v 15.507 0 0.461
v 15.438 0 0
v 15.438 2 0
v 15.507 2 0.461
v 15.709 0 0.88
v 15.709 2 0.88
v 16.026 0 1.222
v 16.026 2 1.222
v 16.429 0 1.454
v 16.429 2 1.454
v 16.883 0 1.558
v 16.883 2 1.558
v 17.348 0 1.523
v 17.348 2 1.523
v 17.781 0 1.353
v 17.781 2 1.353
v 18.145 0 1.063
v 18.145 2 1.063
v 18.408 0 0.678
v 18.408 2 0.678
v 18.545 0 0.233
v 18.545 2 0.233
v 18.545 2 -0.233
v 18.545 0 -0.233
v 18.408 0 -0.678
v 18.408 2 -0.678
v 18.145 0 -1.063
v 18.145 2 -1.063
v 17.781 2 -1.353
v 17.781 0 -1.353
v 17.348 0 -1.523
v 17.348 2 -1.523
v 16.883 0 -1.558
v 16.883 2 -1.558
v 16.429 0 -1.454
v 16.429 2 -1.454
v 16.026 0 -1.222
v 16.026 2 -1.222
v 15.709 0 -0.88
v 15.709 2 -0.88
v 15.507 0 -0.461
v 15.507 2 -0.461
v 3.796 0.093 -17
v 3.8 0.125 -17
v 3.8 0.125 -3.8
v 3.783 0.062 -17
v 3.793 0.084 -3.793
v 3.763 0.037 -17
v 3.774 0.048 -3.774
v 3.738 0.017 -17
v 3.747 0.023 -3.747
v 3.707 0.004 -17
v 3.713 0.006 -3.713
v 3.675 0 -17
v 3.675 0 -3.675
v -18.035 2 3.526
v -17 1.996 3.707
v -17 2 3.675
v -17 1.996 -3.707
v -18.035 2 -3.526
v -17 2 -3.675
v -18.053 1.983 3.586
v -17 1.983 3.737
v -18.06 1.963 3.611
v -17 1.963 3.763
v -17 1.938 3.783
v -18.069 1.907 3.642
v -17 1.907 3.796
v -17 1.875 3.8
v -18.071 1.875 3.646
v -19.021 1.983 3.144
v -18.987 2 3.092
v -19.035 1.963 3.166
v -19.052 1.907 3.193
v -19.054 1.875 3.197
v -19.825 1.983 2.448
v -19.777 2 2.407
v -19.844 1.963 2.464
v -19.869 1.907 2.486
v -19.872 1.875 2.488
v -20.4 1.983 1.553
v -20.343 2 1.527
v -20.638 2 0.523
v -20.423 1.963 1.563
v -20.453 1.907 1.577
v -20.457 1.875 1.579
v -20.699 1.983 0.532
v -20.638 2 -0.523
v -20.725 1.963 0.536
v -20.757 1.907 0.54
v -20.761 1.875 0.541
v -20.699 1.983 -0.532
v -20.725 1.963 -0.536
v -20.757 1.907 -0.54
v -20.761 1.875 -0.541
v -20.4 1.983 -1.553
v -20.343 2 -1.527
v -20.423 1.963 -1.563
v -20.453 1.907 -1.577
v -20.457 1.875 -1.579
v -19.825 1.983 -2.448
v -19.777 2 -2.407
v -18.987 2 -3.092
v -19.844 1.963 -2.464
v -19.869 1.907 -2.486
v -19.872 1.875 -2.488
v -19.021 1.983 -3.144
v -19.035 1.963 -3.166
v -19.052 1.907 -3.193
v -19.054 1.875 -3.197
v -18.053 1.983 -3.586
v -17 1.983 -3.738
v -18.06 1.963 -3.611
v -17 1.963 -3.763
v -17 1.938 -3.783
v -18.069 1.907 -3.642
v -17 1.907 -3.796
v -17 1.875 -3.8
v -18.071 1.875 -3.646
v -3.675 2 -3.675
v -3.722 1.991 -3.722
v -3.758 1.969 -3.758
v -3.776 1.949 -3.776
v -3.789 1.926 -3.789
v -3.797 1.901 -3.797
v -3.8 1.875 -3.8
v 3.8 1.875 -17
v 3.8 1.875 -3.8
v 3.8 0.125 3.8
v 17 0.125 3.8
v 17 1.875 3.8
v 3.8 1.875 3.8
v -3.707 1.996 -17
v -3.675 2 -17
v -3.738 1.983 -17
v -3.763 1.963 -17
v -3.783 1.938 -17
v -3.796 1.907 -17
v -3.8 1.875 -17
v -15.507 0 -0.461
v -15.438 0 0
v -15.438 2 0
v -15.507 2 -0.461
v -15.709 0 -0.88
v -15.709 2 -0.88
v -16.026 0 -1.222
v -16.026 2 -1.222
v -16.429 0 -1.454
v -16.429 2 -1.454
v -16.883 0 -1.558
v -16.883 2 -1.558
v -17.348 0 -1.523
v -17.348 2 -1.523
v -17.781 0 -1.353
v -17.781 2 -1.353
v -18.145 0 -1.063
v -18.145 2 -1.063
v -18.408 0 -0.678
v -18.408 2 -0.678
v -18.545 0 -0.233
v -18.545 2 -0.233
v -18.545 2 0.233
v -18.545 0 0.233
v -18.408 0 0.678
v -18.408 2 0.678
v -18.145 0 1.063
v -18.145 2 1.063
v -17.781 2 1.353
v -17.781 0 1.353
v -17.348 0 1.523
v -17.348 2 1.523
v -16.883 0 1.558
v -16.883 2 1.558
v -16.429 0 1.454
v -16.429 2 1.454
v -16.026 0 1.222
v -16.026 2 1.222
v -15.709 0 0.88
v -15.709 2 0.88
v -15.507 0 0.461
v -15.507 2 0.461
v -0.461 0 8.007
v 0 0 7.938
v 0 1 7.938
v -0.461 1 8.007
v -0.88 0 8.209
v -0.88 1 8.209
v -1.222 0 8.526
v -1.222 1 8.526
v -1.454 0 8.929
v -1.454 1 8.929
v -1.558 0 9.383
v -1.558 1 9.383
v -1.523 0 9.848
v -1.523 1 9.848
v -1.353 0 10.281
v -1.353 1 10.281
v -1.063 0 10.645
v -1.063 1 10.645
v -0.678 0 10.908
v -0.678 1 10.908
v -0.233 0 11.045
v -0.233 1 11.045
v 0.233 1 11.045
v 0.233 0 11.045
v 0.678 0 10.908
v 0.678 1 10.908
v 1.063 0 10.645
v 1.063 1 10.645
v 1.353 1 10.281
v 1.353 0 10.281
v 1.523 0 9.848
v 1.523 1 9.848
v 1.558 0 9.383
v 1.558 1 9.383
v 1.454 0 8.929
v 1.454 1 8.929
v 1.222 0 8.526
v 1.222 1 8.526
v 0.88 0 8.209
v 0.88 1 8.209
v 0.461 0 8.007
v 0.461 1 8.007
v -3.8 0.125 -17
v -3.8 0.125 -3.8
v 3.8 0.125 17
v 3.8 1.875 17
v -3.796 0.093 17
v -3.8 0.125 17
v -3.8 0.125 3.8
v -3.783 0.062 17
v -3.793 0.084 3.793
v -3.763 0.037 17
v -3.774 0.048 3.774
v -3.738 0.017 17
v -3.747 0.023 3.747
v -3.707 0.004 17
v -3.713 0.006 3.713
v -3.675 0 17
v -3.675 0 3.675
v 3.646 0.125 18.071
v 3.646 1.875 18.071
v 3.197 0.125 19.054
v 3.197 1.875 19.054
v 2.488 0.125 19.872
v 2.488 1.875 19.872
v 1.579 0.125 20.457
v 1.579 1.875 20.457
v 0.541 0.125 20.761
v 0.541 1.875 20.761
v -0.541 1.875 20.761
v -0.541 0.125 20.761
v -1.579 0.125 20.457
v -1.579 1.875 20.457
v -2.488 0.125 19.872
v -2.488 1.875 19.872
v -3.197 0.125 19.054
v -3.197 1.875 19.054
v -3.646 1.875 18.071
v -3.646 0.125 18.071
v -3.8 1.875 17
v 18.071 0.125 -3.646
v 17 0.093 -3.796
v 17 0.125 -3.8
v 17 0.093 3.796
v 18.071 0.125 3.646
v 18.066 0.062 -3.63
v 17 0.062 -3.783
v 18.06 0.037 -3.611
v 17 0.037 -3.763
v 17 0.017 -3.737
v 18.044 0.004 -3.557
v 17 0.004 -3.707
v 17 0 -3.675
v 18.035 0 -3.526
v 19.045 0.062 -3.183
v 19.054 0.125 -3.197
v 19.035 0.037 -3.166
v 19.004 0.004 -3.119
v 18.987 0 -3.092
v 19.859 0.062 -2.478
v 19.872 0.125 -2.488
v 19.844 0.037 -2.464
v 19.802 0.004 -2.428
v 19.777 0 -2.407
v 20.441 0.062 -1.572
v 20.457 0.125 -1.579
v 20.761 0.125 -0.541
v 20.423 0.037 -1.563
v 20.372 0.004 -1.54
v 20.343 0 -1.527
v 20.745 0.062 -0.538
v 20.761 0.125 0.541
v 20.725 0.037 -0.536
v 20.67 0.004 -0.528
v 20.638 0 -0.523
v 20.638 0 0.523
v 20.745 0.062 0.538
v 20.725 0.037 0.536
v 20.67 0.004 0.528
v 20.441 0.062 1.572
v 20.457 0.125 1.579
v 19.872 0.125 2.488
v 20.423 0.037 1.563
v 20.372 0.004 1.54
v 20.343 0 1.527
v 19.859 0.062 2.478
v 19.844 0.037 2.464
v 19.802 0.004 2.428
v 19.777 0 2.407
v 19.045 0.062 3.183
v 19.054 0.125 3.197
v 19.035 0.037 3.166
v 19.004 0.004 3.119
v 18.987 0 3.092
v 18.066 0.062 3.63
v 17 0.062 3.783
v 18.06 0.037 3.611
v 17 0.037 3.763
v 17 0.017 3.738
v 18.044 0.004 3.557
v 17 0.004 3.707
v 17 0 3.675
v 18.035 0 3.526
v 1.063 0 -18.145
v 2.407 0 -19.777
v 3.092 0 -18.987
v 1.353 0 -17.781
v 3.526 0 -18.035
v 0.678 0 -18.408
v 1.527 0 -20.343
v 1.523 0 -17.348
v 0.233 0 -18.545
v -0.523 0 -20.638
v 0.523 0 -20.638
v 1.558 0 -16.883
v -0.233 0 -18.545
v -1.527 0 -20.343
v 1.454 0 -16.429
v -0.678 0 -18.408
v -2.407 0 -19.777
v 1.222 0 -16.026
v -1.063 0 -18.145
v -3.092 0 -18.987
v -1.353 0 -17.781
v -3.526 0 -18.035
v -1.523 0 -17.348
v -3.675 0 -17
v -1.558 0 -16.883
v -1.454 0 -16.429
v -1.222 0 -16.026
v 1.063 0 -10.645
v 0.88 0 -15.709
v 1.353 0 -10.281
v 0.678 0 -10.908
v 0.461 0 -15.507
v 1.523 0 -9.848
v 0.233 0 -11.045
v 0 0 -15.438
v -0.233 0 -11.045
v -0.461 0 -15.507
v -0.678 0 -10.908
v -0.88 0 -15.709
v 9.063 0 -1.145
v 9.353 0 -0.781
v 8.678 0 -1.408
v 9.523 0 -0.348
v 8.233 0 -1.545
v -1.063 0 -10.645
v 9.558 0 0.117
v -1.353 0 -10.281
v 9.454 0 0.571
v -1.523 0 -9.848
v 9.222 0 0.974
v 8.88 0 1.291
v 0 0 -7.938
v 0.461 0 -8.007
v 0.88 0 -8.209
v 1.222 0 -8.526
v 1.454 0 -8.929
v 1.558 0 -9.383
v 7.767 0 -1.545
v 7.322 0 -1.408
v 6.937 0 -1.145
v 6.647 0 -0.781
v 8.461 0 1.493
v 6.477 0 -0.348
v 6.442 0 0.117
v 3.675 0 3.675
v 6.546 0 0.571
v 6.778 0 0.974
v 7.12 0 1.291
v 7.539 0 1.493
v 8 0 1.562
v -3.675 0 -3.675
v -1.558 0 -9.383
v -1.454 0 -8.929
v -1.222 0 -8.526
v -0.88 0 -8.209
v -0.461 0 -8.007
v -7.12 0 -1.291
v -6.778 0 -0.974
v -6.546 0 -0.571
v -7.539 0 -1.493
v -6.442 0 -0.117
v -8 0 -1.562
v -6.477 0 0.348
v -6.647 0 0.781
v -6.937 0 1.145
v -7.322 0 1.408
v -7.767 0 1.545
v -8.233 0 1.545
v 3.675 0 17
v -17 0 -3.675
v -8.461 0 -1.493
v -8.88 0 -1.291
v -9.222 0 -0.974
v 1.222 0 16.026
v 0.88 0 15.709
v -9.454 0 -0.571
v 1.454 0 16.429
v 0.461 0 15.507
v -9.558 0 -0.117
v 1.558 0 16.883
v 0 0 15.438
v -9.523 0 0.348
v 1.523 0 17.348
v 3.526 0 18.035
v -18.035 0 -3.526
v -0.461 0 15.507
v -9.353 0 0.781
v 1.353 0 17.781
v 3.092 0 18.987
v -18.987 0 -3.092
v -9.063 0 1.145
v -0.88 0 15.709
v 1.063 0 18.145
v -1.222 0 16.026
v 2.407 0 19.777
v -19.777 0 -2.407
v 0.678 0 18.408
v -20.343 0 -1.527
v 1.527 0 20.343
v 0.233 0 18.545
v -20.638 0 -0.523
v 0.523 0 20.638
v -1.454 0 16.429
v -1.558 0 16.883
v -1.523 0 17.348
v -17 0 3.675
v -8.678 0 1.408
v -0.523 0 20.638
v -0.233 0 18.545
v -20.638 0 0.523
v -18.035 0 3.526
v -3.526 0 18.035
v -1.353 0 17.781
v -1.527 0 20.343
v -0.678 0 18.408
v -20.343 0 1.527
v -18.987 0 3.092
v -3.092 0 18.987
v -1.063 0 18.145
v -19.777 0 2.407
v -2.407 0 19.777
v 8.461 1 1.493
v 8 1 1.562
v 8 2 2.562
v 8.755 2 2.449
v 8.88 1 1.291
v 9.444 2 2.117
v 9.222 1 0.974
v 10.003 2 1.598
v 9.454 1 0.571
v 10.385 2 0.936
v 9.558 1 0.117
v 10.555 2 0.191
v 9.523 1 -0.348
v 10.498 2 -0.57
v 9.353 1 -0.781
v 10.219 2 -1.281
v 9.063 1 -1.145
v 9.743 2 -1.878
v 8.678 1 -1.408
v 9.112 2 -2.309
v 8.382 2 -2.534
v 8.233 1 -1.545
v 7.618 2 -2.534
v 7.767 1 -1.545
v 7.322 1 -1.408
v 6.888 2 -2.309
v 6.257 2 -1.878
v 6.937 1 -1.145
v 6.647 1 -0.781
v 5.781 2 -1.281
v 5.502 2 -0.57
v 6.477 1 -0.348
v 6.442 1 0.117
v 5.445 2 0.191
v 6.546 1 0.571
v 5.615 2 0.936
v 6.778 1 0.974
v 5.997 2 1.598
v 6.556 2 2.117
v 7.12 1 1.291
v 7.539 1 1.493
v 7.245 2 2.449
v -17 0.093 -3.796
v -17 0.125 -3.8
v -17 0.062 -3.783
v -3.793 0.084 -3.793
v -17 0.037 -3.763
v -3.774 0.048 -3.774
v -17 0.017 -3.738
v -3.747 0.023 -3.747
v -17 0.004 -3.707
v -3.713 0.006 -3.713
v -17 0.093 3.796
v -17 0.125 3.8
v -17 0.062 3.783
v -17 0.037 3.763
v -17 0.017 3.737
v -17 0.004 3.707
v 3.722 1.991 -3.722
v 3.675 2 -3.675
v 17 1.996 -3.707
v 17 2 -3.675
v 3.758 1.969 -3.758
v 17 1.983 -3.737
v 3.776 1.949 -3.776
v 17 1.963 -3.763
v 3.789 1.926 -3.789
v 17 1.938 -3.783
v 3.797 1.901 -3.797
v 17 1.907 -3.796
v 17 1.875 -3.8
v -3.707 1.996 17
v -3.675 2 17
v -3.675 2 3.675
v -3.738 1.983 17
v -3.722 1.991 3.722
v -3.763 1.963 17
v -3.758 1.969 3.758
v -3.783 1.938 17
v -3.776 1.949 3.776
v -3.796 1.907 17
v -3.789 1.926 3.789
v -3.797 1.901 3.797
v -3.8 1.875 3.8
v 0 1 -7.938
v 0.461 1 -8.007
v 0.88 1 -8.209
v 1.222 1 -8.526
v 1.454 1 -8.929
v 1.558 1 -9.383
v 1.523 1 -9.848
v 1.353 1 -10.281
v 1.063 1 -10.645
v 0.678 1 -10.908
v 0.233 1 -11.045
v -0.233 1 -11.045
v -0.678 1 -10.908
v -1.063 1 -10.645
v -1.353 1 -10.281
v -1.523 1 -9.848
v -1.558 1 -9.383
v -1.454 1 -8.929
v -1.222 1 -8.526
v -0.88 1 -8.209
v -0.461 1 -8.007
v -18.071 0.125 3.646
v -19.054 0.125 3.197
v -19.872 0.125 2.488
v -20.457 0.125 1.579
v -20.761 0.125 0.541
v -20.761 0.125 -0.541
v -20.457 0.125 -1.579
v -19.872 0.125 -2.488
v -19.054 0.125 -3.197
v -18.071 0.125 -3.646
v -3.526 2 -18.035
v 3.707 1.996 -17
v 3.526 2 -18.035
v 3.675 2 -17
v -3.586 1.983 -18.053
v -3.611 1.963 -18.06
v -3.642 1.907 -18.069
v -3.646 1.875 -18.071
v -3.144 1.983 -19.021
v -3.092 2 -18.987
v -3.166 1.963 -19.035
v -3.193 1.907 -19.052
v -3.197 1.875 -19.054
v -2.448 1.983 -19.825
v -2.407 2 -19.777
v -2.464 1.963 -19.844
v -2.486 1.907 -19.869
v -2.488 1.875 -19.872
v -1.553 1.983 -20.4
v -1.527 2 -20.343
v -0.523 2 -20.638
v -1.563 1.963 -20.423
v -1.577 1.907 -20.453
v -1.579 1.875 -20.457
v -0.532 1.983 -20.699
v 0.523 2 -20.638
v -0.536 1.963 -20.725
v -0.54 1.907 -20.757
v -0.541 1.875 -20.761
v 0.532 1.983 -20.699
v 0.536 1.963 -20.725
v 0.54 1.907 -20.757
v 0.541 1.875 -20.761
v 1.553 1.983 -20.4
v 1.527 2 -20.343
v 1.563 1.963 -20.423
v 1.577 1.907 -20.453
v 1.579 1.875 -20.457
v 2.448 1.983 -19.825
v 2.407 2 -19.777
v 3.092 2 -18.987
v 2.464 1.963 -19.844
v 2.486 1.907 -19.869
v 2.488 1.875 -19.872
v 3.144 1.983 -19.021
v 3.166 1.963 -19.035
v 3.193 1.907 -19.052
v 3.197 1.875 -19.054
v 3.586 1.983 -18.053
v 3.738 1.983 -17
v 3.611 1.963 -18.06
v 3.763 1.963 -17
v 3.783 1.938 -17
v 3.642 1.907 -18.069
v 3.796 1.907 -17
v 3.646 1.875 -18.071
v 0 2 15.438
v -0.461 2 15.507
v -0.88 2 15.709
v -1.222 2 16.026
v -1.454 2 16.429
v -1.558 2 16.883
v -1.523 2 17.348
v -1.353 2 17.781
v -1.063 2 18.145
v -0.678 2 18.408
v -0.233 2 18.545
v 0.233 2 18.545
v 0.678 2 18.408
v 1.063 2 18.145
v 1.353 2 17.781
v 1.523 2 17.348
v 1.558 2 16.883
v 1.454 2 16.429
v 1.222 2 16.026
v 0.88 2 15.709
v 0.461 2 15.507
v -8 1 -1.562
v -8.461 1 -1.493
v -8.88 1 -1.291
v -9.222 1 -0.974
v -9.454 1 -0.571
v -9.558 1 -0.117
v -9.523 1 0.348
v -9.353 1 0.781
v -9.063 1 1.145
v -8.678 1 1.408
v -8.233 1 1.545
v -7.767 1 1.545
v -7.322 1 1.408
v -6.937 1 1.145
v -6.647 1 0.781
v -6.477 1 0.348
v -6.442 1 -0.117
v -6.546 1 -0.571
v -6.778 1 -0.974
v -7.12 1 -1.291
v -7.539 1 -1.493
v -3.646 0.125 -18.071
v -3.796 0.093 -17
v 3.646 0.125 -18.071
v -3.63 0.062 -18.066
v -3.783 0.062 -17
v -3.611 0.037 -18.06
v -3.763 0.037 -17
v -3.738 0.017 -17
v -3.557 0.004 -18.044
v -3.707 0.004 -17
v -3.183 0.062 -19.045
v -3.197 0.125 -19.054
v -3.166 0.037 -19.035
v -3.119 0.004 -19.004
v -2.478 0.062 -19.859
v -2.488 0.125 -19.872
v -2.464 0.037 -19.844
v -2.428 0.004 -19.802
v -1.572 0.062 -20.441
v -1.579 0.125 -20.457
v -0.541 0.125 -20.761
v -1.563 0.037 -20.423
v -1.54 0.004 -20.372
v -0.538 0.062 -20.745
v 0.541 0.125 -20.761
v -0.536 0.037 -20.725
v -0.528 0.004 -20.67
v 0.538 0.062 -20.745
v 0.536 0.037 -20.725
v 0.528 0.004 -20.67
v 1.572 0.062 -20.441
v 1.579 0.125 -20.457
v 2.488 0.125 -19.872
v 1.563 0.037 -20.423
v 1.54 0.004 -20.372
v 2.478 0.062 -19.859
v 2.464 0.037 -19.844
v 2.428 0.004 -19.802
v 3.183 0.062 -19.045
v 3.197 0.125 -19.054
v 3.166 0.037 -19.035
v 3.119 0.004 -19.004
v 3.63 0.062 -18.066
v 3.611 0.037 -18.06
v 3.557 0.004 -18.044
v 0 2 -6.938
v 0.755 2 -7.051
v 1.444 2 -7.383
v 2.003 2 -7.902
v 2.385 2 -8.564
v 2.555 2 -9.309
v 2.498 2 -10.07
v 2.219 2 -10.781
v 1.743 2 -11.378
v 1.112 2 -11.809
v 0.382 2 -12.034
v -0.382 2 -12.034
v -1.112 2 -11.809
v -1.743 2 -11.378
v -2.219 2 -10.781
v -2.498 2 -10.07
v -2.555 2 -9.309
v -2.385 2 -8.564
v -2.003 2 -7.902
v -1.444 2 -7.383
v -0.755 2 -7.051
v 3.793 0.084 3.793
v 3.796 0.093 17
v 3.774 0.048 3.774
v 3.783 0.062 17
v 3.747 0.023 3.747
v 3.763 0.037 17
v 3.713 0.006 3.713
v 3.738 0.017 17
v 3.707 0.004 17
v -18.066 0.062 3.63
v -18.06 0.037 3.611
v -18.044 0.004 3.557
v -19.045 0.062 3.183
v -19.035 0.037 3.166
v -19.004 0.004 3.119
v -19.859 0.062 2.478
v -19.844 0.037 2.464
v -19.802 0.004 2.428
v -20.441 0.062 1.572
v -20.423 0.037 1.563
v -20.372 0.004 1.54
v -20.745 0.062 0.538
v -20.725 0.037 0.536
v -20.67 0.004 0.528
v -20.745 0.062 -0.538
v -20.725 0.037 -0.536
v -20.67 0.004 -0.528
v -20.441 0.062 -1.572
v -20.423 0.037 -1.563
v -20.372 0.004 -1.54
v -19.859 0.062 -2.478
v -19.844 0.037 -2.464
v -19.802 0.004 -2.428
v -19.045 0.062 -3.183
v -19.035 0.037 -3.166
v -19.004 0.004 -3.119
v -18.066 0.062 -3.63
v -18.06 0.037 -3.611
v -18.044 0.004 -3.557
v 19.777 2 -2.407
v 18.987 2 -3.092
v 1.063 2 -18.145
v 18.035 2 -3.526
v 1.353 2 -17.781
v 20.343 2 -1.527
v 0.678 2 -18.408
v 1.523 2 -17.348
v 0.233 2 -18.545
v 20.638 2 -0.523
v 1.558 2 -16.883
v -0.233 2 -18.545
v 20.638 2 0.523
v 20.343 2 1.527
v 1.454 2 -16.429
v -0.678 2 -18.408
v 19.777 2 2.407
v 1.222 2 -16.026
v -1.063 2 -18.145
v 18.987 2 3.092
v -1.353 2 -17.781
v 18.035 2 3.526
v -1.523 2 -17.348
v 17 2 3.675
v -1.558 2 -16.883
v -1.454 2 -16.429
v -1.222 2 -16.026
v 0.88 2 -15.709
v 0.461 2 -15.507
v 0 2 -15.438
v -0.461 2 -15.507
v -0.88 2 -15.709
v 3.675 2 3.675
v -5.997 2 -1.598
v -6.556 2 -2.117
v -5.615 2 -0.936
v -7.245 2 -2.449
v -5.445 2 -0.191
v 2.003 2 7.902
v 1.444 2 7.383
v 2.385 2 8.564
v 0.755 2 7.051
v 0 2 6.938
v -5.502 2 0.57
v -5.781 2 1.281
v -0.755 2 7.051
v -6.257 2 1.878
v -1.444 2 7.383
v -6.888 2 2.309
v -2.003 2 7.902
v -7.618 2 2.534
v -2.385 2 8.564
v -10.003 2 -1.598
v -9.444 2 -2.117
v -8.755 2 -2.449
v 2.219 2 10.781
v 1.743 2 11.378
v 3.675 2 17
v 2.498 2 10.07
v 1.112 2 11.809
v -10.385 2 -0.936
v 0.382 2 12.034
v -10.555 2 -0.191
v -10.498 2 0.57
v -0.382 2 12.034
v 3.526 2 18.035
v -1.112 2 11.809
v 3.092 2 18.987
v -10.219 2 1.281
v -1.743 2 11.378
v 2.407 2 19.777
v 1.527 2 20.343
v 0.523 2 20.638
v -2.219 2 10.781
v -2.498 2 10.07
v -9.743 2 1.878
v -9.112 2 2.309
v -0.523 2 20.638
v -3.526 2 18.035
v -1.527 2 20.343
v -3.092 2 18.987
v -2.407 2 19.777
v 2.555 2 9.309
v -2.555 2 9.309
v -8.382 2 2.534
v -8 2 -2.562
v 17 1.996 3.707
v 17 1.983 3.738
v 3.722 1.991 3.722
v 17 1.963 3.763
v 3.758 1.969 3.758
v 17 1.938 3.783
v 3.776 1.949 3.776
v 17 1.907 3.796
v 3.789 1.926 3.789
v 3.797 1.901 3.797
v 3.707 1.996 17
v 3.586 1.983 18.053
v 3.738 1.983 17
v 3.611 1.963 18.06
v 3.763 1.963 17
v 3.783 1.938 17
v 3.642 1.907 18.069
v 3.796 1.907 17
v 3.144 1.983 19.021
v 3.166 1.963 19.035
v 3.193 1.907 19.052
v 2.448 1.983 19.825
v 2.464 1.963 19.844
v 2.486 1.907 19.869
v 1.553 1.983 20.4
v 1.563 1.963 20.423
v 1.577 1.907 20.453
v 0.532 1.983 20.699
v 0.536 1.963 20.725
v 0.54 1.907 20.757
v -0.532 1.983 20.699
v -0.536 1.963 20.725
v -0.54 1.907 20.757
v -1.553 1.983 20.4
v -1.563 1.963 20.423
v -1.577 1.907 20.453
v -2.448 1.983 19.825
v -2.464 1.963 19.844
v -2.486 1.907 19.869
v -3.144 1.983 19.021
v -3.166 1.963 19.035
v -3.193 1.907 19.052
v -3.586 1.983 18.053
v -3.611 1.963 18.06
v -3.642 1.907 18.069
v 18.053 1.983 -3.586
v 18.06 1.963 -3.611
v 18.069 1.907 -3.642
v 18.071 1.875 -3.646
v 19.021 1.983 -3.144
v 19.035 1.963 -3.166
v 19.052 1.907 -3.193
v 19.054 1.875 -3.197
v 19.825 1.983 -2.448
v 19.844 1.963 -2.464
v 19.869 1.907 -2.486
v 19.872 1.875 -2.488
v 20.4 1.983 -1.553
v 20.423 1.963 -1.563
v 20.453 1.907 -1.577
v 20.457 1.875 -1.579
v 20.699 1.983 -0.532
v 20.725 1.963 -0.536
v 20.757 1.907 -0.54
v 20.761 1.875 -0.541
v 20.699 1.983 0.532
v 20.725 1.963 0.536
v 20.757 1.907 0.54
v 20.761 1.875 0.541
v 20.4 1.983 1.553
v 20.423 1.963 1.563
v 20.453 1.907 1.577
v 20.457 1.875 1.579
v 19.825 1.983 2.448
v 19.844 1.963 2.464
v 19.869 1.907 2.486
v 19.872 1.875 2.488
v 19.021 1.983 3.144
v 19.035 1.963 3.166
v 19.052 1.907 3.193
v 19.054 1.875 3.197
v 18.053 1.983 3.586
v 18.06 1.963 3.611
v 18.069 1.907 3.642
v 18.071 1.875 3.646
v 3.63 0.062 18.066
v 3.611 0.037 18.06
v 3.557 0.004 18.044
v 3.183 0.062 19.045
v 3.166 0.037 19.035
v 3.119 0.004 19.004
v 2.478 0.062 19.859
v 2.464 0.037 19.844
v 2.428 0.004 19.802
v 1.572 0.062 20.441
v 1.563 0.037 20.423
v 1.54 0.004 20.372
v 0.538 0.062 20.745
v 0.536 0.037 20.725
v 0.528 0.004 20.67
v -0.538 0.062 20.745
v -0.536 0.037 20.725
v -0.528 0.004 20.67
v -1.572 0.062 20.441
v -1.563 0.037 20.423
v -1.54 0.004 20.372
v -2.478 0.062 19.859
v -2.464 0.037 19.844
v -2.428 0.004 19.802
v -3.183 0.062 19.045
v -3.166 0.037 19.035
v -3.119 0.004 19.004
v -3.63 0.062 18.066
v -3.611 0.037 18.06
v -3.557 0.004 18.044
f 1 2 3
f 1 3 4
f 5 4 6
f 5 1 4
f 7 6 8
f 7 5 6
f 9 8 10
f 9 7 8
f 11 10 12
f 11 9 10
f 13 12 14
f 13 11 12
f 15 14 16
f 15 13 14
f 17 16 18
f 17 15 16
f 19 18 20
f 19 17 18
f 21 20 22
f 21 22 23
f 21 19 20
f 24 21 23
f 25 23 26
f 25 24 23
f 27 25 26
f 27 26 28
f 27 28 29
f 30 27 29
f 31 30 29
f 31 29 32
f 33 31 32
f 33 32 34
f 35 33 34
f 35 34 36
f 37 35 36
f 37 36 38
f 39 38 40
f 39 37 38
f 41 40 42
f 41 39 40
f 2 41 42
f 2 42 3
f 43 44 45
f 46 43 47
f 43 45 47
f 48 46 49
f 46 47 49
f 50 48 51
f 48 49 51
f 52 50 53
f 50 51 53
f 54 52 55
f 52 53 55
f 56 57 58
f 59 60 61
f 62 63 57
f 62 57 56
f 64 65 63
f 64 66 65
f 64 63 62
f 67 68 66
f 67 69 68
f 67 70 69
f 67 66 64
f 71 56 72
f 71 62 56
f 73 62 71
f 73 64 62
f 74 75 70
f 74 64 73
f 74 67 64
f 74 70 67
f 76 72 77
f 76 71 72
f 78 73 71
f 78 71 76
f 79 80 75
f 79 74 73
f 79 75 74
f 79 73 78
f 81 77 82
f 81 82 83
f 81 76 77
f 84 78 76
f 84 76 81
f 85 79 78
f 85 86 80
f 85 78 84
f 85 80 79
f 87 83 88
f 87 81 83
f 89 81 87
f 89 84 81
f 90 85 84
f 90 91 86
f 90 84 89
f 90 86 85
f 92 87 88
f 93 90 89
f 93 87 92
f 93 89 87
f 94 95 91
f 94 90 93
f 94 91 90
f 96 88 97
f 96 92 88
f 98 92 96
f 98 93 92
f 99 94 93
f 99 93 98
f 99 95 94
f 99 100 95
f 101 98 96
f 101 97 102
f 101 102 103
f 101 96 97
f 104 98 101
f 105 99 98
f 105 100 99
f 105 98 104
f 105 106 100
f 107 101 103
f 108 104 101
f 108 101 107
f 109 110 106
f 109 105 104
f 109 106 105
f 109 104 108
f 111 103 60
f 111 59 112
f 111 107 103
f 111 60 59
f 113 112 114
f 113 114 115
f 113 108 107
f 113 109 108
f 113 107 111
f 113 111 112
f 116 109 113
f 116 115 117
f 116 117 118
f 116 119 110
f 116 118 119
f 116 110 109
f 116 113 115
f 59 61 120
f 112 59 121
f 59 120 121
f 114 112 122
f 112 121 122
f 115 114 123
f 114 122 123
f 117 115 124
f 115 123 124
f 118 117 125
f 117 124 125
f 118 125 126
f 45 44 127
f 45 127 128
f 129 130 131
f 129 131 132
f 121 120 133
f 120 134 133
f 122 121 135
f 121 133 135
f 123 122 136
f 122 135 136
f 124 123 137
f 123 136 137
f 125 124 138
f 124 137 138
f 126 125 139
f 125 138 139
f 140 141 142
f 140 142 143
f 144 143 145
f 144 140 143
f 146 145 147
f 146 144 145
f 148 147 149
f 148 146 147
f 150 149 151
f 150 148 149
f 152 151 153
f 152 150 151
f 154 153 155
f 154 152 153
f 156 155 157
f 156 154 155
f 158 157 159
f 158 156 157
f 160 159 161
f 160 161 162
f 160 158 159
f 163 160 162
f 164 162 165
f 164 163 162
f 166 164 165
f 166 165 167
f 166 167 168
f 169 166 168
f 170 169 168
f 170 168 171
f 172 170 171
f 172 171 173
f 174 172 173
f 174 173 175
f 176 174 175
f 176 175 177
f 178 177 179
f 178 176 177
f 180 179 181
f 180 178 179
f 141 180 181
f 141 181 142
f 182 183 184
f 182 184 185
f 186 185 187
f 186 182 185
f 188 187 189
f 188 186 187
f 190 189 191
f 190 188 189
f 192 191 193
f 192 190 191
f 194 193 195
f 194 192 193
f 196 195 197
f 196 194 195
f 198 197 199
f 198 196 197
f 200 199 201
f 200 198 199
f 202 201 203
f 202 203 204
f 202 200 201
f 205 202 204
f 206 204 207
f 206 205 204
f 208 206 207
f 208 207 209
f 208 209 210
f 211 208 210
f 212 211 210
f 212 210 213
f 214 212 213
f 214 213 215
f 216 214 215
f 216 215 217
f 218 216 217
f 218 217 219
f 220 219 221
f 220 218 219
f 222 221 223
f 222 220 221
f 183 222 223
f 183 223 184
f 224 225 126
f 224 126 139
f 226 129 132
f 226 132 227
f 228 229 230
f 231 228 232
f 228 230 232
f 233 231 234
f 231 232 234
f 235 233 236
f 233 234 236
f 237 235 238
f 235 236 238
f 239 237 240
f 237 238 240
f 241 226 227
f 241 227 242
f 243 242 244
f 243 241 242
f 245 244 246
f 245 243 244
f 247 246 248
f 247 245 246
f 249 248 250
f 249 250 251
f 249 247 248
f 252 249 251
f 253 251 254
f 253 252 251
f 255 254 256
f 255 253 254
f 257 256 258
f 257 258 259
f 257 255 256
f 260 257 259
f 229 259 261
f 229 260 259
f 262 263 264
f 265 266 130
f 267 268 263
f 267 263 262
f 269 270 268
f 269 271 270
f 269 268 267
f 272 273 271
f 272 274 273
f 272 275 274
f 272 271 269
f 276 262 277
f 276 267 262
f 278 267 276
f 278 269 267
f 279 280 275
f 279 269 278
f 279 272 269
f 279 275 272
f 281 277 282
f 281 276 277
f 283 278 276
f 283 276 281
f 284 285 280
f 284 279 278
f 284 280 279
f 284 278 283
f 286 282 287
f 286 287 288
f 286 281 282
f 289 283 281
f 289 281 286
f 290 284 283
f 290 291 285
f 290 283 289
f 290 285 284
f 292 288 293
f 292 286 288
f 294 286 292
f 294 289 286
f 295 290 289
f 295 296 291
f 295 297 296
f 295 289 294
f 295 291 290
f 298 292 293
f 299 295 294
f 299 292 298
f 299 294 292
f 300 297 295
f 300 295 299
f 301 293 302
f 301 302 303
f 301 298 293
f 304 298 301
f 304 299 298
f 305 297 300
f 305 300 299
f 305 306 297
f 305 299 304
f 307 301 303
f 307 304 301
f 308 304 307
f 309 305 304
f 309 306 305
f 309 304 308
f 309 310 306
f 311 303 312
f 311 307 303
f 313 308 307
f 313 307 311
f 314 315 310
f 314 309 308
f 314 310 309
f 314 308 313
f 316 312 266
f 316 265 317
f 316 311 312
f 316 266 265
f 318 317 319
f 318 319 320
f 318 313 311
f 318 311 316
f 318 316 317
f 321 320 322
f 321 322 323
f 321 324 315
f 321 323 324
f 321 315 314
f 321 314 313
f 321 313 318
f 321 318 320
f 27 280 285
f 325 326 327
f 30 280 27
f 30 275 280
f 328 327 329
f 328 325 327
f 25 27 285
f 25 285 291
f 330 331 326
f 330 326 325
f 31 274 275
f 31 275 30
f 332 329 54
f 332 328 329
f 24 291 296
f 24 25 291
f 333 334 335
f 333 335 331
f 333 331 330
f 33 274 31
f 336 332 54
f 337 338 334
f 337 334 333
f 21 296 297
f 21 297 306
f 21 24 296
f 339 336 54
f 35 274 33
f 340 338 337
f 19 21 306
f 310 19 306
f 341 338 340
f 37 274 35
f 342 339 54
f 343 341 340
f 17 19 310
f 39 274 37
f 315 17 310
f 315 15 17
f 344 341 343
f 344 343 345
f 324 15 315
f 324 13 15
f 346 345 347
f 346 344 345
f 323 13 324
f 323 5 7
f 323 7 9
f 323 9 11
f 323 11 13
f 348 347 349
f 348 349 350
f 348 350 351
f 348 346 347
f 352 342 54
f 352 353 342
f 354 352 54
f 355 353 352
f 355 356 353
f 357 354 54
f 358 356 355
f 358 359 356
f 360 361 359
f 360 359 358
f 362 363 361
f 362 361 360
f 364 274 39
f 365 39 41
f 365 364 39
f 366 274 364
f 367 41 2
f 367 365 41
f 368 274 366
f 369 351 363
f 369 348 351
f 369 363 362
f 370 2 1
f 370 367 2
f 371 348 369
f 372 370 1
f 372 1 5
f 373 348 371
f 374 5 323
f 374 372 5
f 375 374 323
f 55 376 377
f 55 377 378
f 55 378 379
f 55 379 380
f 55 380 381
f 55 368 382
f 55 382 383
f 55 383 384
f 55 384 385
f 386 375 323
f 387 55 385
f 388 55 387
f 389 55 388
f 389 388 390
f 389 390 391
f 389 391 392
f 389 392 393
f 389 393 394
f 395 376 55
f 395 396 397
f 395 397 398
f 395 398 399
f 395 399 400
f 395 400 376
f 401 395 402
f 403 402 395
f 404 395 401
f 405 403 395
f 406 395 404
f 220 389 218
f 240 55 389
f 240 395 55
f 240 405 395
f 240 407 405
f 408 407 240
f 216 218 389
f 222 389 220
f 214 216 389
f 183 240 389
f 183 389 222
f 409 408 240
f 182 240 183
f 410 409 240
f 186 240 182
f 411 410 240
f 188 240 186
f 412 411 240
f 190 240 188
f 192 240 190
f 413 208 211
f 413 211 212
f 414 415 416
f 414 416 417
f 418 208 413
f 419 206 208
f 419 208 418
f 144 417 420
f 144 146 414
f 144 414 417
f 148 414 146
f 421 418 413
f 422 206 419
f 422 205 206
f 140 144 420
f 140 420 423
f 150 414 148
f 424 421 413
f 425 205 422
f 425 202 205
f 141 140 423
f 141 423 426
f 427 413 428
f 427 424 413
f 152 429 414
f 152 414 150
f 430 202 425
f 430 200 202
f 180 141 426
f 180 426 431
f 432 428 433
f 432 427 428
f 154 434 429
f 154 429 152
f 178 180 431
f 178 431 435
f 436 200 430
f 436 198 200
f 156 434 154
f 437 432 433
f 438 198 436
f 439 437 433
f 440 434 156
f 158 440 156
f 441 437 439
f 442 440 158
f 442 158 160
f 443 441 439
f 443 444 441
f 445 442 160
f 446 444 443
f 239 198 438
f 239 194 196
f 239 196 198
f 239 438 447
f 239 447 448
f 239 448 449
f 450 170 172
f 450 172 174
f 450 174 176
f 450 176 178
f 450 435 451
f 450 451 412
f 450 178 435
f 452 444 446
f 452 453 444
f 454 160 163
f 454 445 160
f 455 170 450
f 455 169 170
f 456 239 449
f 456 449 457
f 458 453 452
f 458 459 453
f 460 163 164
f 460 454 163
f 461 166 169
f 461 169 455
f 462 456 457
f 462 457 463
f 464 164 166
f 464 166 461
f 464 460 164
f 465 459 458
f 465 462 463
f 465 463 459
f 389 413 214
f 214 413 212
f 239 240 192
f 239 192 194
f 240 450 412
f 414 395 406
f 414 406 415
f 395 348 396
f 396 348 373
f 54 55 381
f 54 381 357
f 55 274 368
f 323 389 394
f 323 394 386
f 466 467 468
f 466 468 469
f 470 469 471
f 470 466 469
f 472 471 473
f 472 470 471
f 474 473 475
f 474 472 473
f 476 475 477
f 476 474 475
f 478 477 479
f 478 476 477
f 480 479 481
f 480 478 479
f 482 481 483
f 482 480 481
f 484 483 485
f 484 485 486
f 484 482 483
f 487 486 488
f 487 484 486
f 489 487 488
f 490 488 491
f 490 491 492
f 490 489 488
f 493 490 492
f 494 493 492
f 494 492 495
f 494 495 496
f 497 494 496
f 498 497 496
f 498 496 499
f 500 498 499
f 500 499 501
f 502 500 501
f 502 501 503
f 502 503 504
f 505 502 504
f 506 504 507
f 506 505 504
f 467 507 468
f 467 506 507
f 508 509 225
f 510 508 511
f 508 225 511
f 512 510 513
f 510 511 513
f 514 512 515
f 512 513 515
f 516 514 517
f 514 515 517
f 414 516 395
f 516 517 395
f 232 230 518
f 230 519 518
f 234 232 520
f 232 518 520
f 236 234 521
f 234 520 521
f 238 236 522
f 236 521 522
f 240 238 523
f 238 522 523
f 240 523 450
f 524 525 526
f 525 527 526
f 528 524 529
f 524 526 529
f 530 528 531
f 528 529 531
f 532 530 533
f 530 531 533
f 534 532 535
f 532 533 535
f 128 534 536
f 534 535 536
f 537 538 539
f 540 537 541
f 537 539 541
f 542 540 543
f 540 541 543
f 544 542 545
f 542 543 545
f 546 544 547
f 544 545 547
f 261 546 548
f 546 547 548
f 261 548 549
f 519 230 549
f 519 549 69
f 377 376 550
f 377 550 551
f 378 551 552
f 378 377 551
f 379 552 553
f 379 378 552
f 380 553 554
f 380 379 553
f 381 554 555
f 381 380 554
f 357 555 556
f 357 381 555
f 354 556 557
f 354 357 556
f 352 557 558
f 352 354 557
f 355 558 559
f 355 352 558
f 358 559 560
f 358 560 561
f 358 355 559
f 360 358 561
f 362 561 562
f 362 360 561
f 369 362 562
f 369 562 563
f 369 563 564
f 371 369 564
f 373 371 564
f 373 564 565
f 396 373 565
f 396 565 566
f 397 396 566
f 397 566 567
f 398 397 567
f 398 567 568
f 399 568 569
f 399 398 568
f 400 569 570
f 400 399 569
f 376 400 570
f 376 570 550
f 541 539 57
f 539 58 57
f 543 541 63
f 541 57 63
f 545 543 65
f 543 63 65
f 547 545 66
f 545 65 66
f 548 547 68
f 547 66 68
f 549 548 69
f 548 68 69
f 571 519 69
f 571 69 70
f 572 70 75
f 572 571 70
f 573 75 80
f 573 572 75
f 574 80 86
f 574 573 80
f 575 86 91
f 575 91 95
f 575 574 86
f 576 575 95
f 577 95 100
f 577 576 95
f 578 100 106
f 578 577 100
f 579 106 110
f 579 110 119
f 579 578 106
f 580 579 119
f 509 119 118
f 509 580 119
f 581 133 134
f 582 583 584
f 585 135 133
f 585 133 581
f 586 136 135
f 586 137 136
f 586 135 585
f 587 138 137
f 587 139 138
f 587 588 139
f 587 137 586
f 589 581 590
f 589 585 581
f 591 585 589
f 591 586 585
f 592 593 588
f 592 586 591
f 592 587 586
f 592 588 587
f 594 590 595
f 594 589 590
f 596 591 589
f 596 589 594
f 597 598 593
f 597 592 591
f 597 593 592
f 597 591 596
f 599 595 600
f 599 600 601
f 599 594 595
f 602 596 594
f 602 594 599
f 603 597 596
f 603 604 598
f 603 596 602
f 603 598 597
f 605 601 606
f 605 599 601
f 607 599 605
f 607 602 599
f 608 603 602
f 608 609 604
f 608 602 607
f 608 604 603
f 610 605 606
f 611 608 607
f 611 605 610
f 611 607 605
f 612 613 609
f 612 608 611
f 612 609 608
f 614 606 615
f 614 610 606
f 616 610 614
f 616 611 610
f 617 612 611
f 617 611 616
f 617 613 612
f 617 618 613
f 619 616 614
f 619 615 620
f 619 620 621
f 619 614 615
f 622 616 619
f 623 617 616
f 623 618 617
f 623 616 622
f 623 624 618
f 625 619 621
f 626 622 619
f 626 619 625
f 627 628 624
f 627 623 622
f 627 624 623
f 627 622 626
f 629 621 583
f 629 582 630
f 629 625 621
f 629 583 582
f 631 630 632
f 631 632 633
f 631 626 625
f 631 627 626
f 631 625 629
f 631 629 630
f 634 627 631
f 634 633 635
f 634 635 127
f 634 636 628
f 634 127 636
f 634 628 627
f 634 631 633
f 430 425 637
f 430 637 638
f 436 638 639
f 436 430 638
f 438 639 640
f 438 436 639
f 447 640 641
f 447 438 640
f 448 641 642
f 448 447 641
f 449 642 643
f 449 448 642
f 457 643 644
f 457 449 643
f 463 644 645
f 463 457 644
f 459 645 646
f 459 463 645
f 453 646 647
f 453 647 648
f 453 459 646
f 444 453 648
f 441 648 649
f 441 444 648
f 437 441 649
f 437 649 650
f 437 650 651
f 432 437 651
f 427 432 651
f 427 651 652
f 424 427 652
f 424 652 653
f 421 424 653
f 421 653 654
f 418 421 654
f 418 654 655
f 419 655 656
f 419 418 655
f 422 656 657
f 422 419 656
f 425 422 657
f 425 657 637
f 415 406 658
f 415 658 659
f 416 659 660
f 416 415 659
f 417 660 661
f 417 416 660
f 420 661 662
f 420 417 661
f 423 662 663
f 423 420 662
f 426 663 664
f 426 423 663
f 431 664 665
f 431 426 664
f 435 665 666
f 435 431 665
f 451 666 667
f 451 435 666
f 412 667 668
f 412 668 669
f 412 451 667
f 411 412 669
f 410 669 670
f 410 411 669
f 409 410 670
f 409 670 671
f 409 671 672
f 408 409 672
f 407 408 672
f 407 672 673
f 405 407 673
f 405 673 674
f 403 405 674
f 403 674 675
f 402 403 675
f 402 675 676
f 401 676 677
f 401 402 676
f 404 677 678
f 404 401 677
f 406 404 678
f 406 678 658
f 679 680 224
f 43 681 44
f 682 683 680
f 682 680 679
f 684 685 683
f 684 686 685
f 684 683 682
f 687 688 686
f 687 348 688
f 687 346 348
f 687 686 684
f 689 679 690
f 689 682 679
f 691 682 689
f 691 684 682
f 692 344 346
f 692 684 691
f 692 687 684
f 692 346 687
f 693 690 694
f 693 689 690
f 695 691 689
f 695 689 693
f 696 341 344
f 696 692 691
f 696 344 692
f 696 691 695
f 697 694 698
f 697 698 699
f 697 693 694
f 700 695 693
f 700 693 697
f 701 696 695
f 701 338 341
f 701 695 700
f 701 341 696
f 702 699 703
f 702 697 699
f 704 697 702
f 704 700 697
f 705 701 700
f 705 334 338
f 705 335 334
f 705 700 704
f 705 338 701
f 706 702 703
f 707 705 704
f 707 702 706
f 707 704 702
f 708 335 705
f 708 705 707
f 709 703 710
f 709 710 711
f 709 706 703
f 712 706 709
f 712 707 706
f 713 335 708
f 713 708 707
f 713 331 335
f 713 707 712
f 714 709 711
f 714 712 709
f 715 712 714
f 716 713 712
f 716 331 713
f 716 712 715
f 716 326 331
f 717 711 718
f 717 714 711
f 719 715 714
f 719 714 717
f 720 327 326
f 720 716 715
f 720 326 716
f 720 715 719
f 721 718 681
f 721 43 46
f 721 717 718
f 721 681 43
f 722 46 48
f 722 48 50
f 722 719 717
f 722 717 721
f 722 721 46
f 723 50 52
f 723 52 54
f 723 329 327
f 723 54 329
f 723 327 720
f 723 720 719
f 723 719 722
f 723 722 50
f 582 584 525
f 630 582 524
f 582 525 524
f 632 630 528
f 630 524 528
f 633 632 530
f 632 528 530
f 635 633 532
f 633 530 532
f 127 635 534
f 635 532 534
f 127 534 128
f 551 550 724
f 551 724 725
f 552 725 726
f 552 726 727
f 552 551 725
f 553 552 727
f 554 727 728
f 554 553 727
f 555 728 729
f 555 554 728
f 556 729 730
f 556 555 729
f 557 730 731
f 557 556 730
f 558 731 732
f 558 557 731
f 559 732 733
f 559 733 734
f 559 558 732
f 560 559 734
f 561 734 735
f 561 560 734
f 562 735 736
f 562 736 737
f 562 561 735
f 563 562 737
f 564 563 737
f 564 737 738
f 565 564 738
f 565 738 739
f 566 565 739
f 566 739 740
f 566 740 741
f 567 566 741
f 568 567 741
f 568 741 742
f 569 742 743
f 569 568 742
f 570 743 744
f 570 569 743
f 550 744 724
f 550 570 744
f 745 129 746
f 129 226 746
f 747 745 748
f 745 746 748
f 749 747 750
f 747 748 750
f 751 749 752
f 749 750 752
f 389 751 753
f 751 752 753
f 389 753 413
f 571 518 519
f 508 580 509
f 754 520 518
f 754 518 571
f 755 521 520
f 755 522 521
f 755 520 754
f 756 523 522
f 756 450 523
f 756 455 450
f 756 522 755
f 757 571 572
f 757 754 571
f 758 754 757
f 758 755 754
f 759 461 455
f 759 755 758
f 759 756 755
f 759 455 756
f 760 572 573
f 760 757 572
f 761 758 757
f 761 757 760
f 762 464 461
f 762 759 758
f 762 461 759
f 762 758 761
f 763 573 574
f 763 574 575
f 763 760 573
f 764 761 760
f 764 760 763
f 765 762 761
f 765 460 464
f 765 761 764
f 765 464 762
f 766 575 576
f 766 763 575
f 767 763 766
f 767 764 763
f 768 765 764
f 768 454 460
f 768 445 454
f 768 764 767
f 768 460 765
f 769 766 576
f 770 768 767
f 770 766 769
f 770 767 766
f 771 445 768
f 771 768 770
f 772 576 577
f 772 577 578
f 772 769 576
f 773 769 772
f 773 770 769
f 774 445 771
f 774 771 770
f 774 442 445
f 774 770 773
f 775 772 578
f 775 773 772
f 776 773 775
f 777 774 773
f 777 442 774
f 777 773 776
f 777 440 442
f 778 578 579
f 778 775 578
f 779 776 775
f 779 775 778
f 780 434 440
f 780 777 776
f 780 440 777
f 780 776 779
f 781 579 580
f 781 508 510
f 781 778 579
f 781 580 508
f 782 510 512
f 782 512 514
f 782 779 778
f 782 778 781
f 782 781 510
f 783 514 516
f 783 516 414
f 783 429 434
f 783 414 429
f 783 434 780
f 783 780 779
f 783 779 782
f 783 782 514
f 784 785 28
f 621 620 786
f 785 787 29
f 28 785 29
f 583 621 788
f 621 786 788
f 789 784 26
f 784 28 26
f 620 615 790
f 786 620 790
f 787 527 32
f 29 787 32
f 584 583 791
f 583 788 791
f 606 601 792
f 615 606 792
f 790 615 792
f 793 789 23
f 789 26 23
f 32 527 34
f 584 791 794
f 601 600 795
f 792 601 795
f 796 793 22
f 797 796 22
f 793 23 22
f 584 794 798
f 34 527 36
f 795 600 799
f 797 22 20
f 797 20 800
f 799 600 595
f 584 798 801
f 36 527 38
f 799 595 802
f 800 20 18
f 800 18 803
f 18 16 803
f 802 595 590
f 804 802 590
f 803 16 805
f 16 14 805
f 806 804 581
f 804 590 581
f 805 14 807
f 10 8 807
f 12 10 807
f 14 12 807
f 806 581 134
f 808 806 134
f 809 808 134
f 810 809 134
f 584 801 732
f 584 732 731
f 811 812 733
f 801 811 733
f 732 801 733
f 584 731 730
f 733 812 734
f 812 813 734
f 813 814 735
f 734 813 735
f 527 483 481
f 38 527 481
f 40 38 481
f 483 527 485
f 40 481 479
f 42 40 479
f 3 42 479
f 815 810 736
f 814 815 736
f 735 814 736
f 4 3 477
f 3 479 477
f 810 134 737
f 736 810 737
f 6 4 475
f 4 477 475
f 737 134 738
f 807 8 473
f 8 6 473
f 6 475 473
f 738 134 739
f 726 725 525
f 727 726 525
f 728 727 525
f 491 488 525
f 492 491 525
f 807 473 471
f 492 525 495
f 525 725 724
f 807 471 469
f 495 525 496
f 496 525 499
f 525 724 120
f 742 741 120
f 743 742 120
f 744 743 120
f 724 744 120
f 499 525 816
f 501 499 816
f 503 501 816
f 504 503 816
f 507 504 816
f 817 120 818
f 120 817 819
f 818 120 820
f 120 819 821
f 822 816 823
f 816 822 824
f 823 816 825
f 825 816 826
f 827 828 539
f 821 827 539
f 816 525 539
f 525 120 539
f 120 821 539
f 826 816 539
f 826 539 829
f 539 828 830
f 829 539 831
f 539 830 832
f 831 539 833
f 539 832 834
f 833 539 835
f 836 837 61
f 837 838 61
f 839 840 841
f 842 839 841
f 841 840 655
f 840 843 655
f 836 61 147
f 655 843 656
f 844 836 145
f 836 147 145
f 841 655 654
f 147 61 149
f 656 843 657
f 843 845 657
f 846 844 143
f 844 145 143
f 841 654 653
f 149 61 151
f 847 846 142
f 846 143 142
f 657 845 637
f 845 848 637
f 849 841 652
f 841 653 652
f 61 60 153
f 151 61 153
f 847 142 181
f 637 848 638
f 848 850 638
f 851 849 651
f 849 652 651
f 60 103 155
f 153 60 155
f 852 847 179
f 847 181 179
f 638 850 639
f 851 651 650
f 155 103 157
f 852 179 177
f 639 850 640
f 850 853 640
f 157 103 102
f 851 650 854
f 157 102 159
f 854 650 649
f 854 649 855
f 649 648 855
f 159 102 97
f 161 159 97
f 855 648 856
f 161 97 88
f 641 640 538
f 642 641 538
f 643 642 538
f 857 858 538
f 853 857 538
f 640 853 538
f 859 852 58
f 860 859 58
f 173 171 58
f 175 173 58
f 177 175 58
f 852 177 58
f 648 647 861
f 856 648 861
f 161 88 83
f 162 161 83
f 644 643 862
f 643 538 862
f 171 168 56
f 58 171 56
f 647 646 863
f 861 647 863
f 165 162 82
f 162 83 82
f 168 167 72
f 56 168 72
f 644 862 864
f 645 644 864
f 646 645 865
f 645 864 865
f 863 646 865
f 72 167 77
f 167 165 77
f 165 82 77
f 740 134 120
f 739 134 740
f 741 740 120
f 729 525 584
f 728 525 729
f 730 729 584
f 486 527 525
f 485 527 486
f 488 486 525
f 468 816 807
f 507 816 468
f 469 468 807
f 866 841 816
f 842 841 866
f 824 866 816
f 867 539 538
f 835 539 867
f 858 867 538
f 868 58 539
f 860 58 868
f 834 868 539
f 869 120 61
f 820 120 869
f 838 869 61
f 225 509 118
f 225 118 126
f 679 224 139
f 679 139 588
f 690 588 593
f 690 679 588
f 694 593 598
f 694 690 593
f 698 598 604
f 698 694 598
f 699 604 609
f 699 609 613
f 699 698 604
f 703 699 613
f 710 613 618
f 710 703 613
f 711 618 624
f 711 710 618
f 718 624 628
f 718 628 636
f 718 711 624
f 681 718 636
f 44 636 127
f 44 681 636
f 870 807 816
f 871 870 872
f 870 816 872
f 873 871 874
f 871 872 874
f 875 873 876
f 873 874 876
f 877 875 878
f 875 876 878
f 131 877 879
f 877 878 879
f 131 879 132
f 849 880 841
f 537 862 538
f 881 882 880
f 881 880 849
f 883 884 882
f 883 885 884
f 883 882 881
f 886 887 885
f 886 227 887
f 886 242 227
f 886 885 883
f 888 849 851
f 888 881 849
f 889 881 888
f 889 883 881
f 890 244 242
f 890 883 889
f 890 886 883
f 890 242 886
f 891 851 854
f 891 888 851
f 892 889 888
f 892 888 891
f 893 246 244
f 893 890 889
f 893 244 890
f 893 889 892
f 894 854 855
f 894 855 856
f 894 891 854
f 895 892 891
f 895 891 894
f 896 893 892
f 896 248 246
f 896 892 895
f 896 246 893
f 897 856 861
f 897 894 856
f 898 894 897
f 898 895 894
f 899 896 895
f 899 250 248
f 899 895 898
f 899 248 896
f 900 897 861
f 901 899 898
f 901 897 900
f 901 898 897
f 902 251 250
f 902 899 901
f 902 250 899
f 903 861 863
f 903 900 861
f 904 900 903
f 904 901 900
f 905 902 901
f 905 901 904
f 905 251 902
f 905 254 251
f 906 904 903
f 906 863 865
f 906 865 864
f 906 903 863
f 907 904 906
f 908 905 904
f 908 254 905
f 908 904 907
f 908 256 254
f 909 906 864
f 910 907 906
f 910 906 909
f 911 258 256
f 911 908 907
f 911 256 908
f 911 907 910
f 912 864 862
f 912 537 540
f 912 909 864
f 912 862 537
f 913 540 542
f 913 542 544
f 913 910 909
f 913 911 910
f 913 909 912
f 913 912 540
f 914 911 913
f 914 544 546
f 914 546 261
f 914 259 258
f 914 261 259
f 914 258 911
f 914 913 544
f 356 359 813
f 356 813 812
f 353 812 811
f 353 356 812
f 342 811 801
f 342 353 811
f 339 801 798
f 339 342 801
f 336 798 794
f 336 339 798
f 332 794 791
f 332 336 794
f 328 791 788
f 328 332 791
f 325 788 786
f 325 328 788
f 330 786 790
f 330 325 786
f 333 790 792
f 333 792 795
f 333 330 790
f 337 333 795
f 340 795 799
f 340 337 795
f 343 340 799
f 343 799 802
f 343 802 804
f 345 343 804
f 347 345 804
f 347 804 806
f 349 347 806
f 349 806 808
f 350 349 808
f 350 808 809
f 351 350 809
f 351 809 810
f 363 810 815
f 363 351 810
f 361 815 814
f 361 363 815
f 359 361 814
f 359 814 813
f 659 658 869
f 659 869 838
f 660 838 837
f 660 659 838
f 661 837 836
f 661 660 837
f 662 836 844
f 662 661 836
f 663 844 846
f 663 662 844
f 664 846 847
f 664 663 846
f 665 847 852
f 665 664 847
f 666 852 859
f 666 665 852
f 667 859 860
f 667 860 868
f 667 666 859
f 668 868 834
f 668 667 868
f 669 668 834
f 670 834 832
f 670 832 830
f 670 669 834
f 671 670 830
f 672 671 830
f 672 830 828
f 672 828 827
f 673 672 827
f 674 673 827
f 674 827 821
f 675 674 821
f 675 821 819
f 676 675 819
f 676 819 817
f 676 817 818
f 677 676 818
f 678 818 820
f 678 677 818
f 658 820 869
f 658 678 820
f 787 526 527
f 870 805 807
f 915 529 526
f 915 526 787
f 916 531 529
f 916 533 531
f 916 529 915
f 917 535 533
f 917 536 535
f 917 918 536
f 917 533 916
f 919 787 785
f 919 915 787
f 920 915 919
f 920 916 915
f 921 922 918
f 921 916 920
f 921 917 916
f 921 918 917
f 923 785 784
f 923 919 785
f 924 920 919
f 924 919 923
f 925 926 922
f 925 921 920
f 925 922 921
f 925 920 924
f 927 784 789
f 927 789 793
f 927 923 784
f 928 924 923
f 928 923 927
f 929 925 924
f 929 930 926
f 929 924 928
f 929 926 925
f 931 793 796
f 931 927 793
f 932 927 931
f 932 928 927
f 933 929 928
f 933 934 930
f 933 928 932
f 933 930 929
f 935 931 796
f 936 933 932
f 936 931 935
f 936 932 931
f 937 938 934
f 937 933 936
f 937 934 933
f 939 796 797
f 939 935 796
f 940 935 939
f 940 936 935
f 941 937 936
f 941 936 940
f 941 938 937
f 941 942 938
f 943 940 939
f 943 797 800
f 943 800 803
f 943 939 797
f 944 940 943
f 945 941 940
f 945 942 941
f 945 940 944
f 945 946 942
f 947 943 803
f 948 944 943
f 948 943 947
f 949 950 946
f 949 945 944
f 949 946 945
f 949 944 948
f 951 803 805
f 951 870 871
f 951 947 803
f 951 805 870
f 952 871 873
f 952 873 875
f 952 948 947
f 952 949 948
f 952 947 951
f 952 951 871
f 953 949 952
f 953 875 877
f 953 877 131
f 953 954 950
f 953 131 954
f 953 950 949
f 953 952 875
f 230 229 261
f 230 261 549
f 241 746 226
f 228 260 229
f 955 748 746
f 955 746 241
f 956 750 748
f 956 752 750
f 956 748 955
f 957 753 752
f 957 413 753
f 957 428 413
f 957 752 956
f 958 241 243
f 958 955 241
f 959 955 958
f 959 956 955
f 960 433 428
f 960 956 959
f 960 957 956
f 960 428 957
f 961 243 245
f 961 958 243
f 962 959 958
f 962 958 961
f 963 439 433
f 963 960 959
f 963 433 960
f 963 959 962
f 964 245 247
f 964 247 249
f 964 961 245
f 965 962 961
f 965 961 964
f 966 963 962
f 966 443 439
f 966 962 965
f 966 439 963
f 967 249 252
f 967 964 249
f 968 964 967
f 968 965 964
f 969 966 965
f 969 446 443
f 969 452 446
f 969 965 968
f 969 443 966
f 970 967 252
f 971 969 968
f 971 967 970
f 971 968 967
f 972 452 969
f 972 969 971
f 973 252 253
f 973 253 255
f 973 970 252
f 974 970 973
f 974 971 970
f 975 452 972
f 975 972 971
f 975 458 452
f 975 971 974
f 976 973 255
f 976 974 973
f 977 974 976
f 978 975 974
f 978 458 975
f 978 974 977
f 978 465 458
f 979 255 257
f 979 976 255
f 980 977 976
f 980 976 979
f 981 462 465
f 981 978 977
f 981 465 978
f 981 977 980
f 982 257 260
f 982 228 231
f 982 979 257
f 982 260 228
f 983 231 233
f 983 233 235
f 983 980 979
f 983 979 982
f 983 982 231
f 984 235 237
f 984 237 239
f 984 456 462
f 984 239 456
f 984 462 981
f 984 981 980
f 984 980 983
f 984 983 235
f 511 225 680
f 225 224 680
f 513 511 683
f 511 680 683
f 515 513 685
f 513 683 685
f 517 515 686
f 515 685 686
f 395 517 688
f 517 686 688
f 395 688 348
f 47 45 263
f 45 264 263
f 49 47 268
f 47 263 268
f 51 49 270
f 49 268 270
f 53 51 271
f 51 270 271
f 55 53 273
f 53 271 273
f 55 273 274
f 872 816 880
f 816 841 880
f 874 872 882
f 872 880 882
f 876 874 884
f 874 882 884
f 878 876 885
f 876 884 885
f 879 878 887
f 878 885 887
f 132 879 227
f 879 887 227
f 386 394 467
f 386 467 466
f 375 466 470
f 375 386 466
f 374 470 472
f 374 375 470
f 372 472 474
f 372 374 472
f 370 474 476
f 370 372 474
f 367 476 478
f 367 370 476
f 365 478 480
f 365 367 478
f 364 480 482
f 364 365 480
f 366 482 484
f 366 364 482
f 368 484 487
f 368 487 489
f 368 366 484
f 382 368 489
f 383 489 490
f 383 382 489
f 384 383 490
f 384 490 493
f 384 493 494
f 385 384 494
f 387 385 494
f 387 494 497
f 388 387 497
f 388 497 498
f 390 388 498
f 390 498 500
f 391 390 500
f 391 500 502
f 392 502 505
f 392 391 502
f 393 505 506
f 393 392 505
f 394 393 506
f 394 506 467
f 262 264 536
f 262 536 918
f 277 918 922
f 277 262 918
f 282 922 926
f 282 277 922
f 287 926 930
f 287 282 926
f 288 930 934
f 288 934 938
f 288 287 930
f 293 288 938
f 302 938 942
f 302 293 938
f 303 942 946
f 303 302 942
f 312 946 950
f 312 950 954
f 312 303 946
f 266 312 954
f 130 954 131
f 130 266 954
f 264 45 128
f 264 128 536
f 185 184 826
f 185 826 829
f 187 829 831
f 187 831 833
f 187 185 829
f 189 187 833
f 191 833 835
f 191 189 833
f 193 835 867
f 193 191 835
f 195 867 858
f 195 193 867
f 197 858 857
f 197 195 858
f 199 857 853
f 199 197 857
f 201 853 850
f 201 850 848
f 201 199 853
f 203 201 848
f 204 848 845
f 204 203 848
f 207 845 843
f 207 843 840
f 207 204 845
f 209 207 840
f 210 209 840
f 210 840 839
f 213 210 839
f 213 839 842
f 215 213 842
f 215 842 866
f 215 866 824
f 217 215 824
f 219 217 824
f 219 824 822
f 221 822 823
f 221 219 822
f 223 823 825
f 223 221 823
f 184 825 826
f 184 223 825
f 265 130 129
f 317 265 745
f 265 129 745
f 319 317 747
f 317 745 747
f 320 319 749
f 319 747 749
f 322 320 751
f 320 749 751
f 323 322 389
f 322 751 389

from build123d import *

# Parameters (mm, degrees)
SKETCH1_R           = 1.5625
BOSS_EXTRUDE1_DEPTH = 2
CIRPATTERN1_COUNT   = 2
CIRPATTERN1_ANGLE   = 90
SKETCH2_R           = 1.5625
CUT_EXTRUDE1_DEPTH  = 2
CHAMFER1_SIZE       = 1
FILLET1_R           = 0.125


with BuildPart() as part:
    # Sketch1 → Boss-Extrude1 (new body)
    with BuildSketch(Plane(origin=(0, 0, 0), x_dir=(1, 0, 0), z_dir=(0, 1, 0))):
        with BuildLine():
            Line((-3.8, -17), (-3.8, 17))
            ThreePointArc((-3.8, 17), (0, 20.8), (3.8, 17))
            Line((3.8, 17), (3.8, -17))
            ThreePointArc((3.8, -17), (0, -20.8), (-3.8, -17))
        make_face()
        with Locations(Location((0, 17, 0), (0, 0, 270))):
            Circle(SKETCH1_R, mode=Mode.SUBTRACT)
        with Locations(Location((0, -17, 0), (0, 0, 90))):
            Circle(SKETCH1_R, mode=Mode.SUBTRACT)
    boss_extrude1 = extrude(amount=BOSS_EXTRUDE1_DEPTH)

    # CirPattern1: Boss-Extrude1 ×2 about axis
    cirpattern1_axis = Axis((0, 0, 0), (0, 1, 0))
    for i in range(1, CIRPATTERN1_COUNT):
        add(boss_extrude1.rotate(cirpattern1_axis, i * CIRPATTERN1_ANGLE / (CIRPATTERN1_COUNT - 1)))

    # Sketch2 → Cut-Extrude1 (cut)
    with BuildSketch(Plane(origin=(0, 0, 0), x_dir=(1, 0, 0), z_dir=(0, 1, 0))):
        with Locations(Location((0, 9.5, 0), (0, 0, 270))):
            Circle(SKETCH2_R)
        with Locations(Location((8, 0, 0), (0, 0, 270))):
            Circle(SKETCH2_R)
        with Locations(Location((0, -9.5, 0), (0, 0, 90))):
            Circle(SKETCH2_R)
        with Locations(Location((-8, 0, 0), (0, 0, 90))):
            Circle(SKETCH2_R)
    extrude(amount=CUT_EXTRUDE1_DEPTH, mode=Mode.SUBTRACT)

    # Chamfer1
    chamfer1_edges = [part.edges().sort_by_distance(p)[0] for p in [
        (0, 2, -11.0625),
        (8, 2, -1.5625),
        (0, 2, 11.0625),
        (-8, 2, 1.5625),
    ]]
    chamfer(chamfer1_edges, length=CHAMFER1_SIZE)

    # Fillet1
    fillet1_edges = [part.edges().sort_by_distance(p)[0] for p in [
        (0, 2, -20.8),
        (-3.8, 2, -10.4),
        (-3.8, 0, 10.4),
        (-3.8, 2, 10.4),
        (3.8, 0, -10.4),
        (3.8, 2, -10.4),
        (10.4, 2, 3.8),
        (20.8, 2, 0),
        (10.4, 2, -3.8),
        (-10.4, 2, -3.8),
        (-20.8, 2, 0),
        (-10.4, 2, 3.8),
        (10.4, 0, -3.8),
        (-10.4, 0, -3.8),
        (10.4, 0, 3.8),
        (-10.4, 0, 3.8),
        (20.8, 0, 0),
        (-20.8, 0, 0),
        (0, 2, 20.8),
        (-3.8, 0, -10.4),
        (0, 0, -20.8),
        (3.8, 0, 10.4),
        (0, 0, 20.8),
        (3.8, 2, 10.4),
    ]]
    fillet(fillet1_edges, radius=FILLET1_R)


solid = part.part
